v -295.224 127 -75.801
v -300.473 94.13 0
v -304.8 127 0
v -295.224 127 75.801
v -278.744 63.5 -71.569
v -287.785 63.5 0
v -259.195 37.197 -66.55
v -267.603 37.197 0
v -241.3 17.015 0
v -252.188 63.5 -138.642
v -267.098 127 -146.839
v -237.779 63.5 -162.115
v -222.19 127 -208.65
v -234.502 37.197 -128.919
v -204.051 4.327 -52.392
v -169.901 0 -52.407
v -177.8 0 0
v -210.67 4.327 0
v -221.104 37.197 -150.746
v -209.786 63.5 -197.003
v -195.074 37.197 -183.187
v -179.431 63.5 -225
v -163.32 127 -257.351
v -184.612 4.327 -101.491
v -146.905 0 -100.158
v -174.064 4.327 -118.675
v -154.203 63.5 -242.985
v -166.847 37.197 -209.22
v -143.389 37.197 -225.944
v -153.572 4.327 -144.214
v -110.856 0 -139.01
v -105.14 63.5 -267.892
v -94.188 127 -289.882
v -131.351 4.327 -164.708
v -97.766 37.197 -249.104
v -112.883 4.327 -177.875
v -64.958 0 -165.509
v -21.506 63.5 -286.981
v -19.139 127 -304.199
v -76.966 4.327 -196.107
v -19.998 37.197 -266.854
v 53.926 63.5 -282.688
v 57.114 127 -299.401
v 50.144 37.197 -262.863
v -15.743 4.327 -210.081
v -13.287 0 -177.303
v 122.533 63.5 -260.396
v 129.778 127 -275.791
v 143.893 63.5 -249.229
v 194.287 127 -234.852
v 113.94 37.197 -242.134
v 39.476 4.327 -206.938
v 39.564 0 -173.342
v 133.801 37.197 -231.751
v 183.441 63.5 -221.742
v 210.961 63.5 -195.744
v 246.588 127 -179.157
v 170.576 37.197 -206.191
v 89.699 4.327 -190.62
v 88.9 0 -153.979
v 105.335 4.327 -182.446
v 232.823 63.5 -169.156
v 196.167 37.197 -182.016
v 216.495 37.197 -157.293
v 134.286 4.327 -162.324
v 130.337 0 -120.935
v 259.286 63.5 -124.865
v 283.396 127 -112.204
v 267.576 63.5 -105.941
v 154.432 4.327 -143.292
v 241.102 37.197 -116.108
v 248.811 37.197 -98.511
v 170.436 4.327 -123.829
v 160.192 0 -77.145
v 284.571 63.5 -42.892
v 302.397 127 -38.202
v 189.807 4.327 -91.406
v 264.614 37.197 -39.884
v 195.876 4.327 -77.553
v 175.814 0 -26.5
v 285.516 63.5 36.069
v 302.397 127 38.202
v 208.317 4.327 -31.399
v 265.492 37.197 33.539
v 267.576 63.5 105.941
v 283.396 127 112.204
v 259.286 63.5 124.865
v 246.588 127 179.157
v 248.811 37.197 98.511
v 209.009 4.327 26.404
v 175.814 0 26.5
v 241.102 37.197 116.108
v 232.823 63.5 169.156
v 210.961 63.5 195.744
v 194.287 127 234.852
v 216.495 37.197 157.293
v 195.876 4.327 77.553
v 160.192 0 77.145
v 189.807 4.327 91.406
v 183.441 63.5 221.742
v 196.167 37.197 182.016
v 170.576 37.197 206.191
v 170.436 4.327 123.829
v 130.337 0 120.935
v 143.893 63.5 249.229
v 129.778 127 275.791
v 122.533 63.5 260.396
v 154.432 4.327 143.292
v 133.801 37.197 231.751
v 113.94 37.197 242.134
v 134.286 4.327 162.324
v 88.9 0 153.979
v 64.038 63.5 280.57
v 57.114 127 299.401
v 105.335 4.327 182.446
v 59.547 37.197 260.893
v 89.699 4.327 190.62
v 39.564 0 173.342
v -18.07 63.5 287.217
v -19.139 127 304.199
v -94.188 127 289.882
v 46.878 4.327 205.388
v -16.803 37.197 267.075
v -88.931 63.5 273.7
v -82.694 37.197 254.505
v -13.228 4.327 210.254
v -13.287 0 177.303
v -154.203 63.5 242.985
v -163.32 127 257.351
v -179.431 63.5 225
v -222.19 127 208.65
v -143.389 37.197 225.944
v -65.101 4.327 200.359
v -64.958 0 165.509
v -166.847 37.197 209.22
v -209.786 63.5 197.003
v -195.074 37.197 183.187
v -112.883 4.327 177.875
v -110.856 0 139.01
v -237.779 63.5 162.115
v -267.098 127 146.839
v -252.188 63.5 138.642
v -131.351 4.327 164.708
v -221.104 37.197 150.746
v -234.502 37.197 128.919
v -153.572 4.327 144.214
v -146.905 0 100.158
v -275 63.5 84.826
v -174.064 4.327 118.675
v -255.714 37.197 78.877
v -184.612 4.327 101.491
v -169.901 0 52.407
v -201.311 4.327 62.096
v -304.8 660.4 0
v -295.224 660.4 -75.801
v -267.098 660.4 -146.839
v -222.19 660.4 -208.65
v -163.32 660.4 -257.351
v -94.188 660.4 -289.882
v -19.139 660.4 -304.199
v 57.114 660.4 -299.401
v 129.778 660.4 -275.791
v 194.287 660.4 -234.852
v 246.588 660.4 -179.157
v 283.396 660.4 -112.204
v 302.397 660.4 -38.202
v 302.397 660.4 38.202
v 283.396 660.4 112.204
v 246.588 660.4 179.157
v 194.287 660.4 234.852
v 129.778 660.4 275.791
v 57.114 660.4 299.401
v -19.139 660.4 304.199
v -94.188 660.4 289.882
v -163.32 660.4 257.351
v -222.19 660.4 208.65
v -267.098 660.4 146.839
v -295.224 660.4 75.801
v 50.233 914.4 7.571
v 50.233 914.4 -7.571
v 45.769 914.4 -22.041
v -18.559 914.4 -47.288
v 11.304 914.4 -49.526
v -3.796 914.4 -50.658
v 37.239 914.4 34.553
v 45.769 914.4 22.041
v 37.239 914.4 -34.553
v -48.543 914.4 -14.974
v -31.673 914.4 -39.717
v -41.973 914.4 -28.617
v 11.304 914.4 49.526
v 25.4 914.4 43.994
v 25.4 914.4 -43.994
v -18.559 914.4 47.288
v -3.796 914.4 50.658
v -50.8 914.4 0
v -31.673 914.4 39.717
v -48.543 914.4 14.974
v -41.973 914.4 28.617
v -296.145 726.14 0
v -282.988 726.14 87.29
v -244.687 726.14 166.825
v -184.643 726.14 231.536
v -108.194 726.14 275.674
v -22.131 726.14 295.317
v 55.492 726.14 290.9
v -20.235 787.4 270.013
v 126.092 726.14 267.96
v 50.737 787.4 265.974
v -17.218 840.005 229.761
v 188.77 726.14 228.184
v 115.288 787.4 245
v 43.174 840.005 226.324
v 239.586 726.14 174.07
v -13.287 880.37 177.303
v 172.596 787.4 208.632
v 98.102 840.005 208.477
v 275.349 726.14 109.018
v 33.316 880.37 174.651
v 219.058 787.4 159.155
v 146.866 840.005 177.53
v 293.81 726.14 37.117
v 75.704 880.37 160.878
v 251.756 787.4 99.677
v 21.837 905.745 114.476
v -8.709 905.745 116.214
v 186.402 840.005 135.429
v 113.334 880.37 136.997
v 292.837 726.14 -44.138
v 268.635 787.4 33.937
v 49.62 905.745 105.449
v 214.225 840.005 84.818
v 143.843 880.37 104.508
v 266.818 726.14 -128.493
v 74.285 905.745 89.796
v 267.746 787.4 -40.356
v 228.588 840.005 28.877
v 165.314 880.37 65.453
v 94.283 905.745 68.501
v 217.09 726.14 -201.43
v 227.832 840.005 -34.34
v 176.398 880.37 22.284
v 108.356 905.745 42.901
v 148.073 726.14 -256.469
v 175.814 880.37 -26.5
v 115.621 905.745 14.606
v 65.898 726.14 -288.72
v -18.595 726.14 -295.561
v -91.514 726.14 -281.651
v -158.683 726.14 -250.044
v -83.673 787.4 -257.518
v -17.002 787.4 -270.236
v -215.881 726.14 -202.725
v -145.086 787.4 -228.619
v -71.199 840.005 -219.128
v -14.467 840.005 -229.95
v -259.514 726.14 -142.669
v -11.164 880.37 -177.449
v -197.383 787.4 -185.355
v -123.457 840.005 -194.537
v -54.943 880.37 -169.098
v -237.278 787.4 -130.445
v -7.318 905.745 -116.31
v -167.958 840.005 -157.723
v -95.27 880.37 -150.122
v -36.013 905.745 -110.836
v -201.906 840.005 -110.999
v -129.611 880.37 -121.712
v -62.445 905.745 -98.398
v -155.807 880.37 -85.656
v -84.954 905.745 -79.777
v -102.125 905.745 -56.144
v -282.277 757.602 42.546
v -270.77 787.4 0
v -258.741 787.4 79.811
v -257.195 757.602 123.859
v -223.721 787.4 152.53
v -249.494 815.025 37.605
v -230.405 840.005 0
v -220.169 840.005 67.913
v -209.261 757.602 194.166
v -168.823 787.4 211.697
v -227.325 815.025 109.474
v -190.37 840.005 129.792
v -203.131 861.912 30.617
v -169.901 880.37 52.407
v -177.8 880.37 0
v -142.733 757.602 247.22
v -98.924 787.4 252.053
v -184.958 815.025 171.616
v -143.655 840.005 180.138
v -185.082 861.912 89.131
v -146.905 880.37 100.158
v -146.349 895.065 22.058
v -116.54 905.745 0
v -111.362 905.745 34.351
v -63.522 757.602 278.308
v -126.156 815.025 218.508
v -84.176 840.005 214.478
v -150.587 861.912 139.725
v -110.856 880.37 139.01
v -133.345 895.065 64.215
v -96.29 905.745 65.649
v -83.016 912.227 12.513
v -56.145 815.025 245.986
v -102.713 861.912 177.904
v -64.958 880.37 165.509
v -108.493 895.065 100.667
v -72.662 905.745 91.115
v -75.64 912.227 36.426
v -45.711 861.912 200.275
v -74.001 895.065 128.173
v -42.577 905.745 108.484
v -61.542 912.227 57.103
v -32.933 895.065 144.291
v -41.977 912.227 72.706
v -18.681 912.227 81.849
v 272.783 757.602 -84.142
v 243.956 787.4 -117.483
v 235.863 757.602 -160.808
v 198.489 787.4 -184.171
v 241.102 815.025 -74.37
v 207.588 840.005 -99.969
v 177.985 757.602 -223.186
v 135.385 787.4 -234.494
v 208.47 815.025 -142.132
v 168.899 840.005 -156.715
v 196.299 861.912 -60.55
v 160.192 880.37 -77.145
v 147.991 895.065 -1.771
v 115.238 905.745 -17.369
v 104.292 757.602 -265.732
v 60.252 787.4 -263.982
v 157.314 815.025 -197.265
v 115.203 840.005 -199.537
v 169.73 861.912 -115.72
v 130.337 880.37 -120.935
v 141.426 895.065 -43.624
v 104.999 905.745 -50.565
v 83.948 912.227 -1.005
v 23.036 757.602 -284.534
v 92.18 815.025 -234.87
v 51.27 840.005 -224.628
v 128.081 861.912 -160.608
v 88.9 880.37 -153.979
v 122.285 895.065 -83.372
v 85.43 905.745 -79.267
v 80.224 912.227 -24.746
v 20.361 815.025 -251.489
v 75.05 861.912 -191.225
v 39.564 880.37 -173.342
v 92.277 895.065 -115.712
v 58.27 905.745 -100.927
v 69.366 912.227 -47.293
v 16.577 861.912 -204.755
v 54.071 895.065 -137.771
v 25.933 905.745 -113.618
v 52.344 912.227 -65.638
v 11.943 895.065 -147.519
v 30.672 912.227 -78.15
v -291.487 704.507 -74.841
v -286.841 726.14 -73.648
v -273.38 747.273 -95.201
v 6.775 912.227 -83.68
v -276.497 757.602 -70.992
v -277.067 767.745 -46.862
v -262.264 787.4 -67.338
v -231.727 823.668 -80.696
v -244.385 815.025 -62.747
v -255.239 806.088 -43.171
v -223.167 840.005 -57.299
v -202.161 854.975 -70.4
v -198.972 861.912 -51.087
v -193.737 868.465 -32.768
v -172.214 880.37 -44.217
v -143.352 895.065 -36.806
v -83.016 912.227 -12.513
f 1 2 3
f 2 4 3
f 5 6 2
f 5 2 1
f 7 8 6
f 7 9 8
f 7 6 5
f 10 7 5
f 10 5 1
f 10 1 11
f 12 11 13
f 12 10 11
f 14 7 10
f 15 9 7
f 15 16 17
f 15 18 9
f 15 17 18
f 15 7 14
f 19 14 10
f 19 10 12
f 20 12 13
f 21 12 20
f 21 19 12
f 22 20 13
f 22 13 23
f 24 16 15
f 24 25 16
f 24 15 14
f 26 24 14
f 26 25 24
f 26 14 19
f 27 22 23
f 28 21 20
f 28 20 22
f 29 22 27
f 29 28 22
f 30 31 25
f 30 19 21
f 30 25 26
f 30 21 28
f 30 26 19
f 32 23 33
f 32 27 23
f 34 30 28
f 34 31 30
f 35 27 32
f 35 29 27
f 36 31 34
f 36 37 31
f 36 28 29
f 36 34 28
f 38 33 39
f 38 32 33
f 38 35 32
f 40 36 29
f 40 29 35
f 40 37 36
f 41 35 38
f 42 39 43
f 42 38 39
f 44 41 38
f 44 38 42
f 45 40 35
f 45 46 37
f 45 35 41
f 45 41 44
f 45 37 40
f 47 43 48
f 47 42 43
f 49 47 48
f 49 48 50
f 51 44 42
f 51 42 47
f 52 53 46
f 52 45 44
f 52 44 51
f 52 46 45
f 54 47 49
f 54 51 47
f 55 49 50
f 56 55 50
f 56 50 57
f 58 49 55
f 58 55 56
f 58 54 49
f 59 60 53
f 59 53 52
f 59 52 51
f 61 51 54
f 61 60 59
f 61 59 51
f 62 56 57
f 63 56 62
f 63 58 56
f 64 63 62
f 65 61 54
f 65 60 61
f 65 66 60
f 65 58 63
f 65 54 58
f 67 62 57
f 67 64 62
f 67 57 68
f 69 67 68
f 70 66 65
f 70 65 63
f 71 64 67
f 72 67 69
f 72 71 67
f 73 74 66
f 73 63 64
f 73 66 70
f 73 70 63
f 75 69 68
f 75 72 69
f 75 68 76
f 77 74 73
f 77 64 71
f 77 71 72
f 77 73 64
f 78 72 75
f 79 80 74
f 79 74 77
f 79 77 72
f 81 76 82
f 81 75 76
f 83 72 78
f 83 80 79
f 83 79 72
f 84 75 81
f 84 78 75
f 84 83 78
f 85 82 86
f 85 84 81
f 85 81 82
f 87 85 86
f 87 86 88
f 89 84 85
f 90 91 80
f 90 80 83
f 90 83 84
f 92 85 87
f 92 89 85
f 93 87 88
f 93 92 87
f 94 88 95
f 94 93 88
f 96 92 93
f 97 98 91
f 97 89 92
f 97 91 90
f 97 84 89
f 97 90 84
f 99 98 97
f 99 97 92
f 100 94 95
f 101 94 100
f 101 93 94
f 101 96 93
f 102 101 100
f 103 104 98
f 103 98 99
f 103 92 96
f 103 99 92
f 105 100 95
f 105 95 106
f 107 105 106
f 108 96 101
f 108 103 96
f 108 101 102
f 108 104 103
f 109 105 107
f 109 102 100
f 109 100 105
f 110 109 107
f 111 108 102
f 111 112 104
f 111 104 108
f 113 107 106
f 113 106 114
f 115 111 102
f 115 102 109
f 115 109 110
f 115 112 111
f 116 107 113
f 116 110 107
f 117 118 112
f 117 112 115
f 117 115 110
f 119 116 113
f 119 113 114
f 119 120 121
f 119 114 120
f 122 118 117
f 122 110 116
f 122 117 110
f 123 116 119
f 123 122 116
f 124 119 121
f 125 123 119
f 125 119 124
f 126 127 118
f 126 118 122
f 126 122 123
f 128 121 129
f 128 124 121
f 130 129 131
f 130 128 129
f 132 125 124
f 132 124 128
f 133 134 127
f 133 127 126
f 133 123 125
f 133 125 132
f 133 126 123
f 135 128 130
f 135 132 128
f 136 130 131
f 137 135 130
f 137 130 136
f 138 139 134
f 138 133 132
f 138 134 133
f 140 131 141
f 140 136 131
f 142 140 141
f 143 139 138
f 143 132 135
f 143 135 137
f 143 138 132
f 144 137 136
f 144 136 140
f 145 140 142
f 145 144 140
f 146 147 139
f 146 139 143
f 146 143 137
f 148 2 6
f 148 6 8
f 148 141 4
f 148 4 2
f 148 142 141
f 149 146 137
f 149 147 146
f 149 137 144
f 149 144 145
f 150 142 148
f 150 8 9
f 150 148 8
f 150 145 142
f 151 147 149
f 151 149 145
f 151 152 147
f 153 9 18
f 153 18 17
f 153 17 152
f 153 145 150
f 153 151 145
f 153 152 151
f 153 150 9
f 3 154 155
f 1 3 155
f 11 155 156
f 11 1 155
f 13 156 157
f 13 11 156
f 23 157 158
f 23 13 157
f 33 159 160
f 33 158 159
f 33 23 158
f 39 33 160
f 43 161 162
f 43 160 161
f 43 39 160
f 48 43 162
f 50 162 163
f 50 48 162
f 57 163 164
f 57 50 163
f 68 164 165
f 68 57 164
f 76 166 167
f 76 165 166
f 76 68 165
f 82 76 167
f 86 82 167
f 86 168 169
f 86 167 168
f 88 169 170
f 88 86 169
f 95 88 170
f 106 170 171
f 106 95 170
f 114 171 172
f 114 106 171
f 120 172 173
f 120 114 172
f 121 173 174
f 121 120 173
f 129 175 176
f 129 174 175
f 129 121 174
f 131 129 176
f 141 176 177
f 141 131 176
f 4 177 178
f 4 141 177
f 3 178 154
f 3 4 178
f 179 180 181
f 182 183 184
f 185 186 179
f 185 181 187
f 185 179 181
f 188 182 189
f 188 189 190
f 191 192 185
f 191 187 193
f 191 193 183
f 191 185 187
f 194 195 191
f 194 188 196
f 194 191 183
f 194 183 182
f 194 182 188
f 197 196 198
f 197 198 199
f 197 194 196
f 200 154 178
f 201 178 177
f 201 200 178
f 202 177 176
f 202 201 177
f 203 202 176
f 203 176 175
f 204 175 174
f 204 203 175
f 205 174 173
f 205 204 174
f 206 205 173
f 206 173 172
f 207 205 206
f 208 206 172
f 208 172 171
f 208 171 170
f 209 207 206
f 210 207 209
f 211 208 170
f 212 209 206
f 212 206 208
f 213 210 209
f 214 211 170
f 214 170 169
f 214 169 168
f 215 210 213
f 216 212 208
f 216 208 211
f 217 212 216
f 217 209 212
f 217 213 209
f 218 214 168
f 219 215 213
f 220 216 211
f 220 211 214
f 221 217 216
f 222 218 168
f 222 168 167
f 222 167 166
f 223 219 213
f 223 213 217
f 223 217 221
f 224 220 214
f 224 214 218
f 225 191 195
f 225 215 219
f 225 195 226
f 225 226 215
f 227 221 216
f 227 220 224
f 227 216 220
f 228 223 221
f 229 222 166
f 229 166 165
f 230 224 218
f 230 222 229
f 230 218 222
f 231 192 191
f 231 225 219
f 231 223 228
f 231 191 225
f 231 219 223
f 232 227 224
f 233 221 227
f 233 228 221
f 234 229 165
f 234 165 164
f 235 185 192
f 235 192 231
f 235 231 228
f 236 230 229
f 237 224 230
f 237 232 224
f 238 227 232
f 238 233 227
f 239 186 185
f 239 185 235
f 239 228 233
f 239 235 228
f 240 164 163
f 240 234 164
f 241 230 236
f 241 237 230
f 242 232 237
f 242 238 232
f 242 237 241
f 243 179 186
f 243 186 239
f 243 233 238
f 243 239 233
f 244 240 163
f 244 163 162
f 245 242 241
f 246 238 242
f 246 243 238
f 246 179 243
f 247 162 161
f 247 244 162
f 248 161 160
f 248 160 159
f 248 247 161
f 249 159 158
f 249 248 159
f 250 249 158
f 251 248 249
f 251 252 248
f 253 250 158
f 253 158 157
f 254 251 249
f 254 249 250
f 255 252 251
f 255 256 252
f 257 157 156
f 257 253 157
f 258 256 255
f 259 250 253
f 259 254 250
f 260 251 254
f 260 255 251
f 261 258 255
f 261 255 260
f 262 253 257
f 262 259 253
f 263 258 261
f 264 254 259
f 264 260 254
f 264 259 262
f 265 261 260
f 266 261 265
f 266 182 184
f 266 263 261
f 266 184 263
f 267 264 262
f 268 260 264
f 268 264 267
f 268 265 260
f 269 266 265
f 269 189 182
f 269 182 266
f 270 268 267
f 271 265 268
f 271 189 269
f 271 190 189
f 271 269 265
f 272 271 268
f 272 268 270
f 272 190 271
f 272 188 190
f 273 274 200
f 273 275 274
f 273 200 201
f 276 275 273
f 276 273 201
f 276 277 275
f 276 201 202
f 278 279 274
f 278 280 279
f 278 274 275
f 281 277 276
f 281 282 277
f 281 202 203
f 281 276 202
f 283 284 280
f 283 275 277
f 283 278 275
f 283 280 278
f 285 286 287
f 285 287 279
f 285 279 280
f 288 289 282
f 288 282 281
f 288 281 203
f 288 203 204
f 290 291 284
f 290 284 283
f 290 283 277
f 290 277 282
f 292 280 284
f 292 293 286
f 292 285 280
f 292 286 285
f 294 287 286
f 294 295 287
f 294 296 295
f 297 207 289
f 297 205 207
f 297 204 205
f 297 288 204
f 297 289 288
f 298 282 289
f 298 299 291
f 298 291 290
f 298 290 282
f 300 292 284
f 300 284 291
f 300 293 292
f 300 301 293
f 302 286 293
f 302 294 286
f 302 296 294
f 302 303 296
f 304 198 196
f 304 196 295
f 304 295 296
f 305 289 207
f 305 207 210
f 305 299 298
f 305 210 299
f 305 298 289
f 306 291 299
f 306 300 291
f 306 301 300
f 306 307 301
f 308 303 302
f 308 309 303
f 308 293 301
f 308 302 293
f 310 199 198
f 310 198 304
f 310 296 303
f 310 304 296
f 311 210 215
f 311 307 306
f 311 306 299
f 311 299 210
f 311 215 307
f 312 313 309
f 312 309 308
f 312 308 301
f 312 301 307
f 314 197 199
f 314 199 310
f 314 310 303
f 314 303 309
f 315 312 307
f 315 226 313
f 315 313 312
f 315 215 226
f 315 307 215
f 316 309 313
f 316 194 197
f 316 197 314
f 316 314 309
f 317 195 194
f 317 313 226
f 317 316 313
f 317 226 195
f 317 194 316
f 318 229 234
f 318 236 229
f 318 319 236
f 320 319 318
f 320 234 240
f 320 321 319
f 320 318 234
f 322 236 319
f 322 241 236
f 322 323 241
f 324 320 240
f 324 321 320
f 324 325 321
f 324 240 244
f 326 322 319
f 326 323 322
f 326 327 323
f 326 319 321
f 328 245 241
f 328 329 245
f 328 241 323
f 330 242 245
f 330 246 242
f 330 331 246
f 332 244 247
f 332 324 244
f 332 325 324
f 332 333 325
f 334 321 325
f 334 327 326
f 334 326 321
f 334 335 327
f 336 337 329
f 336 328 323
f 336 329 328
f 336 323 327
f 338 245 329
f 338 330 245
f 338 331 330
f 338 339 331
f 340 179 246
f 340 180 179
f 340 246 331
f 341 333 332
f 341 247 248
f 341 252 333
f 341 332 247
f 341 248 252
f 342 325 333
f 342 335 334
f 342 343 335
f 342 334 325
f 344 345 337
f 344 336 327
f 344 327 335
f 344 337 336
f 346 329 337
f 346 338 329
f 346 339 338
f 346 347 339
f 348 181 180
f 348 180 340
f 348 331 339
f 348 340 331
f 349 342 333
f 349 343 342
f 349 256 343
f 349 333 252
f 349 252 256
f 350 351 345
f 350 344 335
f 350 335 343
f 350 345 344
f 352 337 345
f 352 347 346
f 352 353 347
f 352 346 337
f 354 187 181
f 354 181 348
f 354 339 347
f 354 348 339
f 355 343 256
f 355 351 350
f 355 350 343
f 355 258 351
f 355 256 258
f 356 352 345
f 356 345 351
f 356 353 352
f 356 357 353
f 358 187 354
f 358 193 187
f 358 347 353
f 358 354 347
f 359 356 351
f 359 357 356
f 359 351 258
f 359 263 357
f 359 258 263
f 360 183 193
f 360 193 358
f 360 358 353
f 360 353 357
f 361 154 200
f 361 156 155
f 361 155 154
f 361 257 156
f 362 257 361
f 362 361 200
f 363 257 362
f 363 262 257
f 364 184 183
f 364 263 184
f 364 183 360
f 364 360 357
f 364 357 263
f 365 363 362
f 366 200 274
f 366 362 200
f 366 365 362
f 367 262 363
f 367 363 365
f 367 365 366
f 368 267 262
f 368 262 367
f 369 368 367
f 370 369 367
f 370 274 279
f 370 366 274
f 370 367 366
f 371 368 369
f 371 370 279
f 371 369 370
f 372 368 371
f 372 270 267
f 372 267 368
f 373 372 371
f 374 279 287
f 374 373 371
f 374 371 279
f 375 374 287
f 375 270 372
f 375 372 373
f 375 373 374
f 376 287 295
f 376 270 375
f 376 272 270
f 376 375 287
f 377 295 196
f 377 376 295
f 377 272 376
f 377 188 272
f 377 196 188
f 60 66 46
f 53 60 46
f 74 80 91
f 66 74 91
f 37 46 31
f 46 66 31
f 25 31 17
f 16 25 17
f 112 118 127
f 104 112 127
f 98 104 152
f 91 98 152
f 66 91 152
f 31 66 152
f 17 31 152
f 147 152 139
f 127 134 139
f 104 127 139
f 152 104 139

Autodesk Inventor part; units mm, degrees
ref_plane "YZ Plane" through (0, 0, 0) normal (1, 0, 0) x (0, 1, 0)
ref_plane "XZ Plane" through (0, 0, 0) normal (0, 1, 0) x (-1, 0, 0)
ref_plane "XY Plane" through (0, 0, 0) normal (0, 0, 1) x (1, 0, 0)
sketch "Sketch1" plane through (0, 0, 0) normal (0, 1, 0) x (-1, 0, 0)
  circle A0 centre (0, 0) radius 304.8
  dimension "d0" = 609.6
extrude "Extrusion1" add sketch "Sketch1" along normal blind 914.4
fillet "Fillet1" radius 254 1 edges at (304.8, 914.4, 0)
fillet "Fillet2" radius 127 1 edges at (304.8, 0, 0)
properties part number "Pool Filter"
